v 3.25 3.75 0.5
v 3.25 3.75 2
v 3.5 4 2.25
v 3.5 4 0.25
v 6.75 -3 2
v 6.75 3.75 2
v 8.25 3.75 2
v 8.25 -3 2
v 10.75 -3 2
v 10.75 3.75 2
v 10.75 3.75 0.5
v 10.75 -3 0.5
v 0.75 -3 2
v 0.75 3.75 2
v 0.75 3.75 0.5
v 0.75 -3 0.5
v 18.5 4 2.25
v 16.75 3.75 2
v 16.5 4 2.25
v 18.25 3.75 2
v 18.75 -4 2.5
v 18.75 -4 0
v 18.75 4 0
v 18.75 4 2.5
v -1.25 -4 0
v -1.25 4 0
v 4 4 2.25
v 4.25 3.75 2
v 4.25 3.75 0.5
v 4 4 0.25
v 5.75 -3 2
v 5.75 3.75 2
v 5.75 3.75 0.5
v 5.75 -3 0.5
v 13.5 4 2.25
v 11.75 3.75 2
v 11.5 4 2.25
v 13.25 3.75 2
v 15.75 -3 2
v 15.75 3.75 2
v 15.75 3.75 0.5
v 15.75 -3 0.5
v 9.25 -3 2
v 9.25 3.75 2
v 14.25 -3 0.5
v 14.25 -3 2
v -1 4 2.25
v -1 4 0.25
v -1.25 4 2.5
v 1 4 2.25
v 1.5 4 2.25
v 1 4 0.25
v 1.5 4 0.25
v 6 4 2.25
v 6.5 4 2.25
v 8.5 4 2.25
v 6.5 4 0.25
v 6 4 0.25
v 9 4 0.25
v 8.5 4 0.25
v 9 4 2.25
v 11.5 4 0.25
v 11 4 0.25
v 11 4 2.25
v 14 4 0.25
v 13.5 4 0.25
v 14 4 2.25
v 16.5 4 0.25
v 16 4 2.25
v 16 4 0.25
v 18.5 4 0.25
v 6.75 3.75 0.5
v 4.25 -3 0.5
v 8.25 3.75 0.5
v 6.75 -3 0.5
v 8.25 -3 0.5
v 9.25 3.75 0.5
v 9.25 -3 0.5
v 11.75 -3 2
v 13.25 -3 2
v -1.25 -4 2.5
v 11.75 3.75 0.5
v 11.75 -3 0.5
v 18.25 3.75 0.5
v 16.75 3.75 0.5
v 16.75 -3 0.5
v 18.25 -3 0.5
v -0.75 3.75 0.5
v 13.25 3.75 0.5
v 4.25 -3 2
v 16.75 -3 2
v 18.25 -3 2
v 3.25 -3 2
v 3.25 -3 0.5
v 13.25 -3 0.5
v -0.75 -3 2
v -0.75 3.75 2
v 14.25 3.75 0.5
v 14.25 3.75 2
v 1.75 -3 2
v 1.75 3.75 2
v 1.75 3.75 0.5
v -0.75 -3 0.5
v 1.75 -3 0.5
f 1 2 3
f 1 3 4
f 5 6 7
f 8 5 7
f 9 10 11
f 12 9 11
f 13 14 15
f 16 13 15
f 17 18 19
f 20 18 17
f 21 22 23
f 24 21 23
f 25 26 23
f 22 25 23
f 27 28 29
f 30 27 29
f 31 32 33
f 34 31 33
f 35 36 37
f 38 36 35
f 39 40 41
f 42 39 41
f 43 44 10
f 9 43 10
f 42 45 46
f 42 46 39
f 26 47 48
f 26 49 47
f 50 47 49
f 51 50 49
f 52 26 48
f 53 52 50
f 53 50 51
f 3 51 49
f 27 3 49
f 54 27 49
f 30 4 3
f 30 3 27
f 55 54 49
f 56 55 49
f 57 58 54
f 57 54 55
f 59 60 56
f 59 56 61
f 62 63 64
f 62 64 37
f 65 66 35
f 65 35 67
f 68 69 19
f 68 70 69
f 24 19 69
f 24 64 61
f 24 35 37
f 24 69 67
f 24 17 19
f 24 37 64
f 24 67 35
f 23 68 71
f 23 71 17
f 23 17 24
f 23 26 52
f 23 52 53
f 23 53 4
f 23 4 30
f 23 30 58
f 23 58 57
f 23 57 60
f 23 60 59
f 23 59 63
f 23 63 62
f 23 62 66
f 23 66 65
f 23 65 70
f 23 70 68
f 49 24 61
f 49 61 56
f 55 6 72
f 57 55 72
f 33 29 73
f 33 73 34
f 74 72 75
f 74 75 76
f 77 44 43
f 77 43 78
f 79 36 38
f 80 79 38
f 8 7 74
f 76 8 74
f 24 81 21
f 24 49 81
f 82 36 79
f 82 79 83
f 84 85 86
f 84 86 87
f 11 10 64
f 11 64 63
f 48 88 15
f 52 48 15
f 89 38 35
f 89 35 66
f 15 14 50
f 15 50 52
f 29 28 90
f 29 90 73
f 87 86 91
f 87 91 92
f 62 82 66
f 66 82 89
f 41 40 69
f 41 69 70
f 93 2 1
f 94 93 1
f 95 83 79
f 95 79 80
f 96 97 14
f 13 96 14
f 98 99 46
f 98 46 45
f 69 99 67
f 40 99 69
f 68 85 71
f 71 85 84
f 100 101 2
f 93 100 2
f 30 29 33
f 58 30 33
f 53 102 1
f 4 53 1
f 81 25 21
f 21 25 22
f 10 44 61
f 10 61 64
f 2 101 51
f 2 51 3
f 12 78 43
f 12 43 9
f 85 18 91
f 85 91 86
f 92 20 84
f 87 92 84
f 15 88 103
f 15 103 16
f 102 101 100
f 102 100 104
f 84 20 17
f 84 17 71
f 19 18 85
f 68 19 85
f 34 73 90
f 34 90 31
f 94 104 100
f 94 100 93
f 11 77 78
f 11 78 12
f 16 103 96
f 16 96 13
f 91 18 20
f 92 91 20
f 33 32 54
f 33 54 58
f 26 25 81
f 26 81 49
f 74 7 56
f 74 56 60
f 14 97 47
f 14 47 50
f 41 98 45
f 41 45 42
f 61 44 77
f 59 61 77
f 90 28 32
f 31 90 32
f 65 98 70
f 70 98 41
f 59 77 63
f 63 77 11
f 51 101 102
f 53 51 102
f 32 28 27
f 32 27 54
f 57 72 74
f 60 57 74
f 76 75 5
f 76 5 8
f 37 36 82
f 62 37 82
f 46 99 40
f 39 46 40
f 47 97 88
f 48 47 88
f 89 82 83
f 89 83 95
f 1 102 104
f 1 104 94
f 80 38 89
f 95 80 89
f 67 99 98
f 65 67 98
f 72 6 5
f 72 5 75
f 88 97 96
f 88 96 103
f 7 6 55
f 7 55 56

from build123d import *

# Parameters (mm, degrees)
SKETCH1_W                  = 2.5
SKETCH1_H                  = 8
BOSS_EXTRUDE1_DEPTH        = 2.5
SKETCH2_W                  = 1.5
SKETCH2_H                  = 1.5
CUT_EXTRUDE2_DEPTH         = 7
CHAMFER3_SIZE              = 0.25
LPATTERN2_COUNT            = 8
LPATTERN2_PITCH            = 2.5
CHAMFER3_OF_LPATTERN2_SIZE = 0.25


with BuildPart() as part:
    # Sketch1 → Boss-Extrude1 (new body)
    with BuildSketch(Plane.XY):
        Rectangle(SKETCH1_W, SKETCH1_H)
    boss_extrude1 = extrude(amount=BOSS_EXTRUDE1_DEPTH)

    # Sketch2 → Cut-Extrude2 (cut)
    with BuildSketch(Plane(origin=(0, 4, 0), x_dir=(1, 0, 0), z_dir=(0, 1, 0))):
        with Locations((0, -1.25)):
            Rectangle(SKETCH2_W, SKETCH2_H)
    cut_extrude2 = extrude(amount=-CUT_EXTRUDE2_DEPTH, mode=Mode.SUBTRACT)

    # Chamfer3
    chamfer3_edges = [part.edges().sort_by_distance(p)[0] for p in [
        (0, 4, 2),
        (0.75, 4, 1.25),
        (0, 4, 0.5),
        (-0.75, 4, 1.25),
    ]]
    chamfer(chamfer3_edges, length=CHAMFER3_SIZE)

    # LPattern2: Boss-Extrude1, Cut-Extrude2 ×8
    with Locations(*[(i * LPATTERN2_PITCH, 0, 0) for i in range(1, LPATTERN2_COUNT)]):
        add(boss_extrude1)
        add(cut_extrude2, mode=Mode.SUBTRACT)

    # Chamfer3 of LPattern2
    chamfer3_of_lpattern2_edges = [part.edges().sort_by_distance(p)[0] for p in [
        (2.5, 4, 2),
        (3.25, 4, 1.25),
        (2.5, 4, 0.5),
        (1.75, 4, 1.25),
        (5, 4, 2),
        (5.75, 4, 1.25),
        (5, 4, 0.5),
        (4.25, 4, 1.25),
        (7.5, 4, 2),
        (8.25, 4, 1.25),
        (7.5, 4, 0.5),
        (6.75, 4, 1.25),
        (10, 4, 2),
        (10.75, 4, 1.25),
        (10, 4, 0.5),
        (9.25, 4, 1.25),
        (12.5, 4, 2),
        (13.25, 4, 1.25),
        (12.5, 4, 0.5),
        (11.75, 4, 1.25),
        (15, 4, 2),
        (15.75, 4, 1.25),
        (15, 4, 0.5),
        (14.25, 4, 1.25),
        (17.5, 4, 2),
        (18.25, 4, 1.25),
        (17.5, 4, 0.5),
        (16.75, 4, 1.25),
    ]]
    chamfer(chamfer3_of_lpattern2_edges, length=CHAMFER3_OF_LPATTERN2_SIZE)


solid = part.part
